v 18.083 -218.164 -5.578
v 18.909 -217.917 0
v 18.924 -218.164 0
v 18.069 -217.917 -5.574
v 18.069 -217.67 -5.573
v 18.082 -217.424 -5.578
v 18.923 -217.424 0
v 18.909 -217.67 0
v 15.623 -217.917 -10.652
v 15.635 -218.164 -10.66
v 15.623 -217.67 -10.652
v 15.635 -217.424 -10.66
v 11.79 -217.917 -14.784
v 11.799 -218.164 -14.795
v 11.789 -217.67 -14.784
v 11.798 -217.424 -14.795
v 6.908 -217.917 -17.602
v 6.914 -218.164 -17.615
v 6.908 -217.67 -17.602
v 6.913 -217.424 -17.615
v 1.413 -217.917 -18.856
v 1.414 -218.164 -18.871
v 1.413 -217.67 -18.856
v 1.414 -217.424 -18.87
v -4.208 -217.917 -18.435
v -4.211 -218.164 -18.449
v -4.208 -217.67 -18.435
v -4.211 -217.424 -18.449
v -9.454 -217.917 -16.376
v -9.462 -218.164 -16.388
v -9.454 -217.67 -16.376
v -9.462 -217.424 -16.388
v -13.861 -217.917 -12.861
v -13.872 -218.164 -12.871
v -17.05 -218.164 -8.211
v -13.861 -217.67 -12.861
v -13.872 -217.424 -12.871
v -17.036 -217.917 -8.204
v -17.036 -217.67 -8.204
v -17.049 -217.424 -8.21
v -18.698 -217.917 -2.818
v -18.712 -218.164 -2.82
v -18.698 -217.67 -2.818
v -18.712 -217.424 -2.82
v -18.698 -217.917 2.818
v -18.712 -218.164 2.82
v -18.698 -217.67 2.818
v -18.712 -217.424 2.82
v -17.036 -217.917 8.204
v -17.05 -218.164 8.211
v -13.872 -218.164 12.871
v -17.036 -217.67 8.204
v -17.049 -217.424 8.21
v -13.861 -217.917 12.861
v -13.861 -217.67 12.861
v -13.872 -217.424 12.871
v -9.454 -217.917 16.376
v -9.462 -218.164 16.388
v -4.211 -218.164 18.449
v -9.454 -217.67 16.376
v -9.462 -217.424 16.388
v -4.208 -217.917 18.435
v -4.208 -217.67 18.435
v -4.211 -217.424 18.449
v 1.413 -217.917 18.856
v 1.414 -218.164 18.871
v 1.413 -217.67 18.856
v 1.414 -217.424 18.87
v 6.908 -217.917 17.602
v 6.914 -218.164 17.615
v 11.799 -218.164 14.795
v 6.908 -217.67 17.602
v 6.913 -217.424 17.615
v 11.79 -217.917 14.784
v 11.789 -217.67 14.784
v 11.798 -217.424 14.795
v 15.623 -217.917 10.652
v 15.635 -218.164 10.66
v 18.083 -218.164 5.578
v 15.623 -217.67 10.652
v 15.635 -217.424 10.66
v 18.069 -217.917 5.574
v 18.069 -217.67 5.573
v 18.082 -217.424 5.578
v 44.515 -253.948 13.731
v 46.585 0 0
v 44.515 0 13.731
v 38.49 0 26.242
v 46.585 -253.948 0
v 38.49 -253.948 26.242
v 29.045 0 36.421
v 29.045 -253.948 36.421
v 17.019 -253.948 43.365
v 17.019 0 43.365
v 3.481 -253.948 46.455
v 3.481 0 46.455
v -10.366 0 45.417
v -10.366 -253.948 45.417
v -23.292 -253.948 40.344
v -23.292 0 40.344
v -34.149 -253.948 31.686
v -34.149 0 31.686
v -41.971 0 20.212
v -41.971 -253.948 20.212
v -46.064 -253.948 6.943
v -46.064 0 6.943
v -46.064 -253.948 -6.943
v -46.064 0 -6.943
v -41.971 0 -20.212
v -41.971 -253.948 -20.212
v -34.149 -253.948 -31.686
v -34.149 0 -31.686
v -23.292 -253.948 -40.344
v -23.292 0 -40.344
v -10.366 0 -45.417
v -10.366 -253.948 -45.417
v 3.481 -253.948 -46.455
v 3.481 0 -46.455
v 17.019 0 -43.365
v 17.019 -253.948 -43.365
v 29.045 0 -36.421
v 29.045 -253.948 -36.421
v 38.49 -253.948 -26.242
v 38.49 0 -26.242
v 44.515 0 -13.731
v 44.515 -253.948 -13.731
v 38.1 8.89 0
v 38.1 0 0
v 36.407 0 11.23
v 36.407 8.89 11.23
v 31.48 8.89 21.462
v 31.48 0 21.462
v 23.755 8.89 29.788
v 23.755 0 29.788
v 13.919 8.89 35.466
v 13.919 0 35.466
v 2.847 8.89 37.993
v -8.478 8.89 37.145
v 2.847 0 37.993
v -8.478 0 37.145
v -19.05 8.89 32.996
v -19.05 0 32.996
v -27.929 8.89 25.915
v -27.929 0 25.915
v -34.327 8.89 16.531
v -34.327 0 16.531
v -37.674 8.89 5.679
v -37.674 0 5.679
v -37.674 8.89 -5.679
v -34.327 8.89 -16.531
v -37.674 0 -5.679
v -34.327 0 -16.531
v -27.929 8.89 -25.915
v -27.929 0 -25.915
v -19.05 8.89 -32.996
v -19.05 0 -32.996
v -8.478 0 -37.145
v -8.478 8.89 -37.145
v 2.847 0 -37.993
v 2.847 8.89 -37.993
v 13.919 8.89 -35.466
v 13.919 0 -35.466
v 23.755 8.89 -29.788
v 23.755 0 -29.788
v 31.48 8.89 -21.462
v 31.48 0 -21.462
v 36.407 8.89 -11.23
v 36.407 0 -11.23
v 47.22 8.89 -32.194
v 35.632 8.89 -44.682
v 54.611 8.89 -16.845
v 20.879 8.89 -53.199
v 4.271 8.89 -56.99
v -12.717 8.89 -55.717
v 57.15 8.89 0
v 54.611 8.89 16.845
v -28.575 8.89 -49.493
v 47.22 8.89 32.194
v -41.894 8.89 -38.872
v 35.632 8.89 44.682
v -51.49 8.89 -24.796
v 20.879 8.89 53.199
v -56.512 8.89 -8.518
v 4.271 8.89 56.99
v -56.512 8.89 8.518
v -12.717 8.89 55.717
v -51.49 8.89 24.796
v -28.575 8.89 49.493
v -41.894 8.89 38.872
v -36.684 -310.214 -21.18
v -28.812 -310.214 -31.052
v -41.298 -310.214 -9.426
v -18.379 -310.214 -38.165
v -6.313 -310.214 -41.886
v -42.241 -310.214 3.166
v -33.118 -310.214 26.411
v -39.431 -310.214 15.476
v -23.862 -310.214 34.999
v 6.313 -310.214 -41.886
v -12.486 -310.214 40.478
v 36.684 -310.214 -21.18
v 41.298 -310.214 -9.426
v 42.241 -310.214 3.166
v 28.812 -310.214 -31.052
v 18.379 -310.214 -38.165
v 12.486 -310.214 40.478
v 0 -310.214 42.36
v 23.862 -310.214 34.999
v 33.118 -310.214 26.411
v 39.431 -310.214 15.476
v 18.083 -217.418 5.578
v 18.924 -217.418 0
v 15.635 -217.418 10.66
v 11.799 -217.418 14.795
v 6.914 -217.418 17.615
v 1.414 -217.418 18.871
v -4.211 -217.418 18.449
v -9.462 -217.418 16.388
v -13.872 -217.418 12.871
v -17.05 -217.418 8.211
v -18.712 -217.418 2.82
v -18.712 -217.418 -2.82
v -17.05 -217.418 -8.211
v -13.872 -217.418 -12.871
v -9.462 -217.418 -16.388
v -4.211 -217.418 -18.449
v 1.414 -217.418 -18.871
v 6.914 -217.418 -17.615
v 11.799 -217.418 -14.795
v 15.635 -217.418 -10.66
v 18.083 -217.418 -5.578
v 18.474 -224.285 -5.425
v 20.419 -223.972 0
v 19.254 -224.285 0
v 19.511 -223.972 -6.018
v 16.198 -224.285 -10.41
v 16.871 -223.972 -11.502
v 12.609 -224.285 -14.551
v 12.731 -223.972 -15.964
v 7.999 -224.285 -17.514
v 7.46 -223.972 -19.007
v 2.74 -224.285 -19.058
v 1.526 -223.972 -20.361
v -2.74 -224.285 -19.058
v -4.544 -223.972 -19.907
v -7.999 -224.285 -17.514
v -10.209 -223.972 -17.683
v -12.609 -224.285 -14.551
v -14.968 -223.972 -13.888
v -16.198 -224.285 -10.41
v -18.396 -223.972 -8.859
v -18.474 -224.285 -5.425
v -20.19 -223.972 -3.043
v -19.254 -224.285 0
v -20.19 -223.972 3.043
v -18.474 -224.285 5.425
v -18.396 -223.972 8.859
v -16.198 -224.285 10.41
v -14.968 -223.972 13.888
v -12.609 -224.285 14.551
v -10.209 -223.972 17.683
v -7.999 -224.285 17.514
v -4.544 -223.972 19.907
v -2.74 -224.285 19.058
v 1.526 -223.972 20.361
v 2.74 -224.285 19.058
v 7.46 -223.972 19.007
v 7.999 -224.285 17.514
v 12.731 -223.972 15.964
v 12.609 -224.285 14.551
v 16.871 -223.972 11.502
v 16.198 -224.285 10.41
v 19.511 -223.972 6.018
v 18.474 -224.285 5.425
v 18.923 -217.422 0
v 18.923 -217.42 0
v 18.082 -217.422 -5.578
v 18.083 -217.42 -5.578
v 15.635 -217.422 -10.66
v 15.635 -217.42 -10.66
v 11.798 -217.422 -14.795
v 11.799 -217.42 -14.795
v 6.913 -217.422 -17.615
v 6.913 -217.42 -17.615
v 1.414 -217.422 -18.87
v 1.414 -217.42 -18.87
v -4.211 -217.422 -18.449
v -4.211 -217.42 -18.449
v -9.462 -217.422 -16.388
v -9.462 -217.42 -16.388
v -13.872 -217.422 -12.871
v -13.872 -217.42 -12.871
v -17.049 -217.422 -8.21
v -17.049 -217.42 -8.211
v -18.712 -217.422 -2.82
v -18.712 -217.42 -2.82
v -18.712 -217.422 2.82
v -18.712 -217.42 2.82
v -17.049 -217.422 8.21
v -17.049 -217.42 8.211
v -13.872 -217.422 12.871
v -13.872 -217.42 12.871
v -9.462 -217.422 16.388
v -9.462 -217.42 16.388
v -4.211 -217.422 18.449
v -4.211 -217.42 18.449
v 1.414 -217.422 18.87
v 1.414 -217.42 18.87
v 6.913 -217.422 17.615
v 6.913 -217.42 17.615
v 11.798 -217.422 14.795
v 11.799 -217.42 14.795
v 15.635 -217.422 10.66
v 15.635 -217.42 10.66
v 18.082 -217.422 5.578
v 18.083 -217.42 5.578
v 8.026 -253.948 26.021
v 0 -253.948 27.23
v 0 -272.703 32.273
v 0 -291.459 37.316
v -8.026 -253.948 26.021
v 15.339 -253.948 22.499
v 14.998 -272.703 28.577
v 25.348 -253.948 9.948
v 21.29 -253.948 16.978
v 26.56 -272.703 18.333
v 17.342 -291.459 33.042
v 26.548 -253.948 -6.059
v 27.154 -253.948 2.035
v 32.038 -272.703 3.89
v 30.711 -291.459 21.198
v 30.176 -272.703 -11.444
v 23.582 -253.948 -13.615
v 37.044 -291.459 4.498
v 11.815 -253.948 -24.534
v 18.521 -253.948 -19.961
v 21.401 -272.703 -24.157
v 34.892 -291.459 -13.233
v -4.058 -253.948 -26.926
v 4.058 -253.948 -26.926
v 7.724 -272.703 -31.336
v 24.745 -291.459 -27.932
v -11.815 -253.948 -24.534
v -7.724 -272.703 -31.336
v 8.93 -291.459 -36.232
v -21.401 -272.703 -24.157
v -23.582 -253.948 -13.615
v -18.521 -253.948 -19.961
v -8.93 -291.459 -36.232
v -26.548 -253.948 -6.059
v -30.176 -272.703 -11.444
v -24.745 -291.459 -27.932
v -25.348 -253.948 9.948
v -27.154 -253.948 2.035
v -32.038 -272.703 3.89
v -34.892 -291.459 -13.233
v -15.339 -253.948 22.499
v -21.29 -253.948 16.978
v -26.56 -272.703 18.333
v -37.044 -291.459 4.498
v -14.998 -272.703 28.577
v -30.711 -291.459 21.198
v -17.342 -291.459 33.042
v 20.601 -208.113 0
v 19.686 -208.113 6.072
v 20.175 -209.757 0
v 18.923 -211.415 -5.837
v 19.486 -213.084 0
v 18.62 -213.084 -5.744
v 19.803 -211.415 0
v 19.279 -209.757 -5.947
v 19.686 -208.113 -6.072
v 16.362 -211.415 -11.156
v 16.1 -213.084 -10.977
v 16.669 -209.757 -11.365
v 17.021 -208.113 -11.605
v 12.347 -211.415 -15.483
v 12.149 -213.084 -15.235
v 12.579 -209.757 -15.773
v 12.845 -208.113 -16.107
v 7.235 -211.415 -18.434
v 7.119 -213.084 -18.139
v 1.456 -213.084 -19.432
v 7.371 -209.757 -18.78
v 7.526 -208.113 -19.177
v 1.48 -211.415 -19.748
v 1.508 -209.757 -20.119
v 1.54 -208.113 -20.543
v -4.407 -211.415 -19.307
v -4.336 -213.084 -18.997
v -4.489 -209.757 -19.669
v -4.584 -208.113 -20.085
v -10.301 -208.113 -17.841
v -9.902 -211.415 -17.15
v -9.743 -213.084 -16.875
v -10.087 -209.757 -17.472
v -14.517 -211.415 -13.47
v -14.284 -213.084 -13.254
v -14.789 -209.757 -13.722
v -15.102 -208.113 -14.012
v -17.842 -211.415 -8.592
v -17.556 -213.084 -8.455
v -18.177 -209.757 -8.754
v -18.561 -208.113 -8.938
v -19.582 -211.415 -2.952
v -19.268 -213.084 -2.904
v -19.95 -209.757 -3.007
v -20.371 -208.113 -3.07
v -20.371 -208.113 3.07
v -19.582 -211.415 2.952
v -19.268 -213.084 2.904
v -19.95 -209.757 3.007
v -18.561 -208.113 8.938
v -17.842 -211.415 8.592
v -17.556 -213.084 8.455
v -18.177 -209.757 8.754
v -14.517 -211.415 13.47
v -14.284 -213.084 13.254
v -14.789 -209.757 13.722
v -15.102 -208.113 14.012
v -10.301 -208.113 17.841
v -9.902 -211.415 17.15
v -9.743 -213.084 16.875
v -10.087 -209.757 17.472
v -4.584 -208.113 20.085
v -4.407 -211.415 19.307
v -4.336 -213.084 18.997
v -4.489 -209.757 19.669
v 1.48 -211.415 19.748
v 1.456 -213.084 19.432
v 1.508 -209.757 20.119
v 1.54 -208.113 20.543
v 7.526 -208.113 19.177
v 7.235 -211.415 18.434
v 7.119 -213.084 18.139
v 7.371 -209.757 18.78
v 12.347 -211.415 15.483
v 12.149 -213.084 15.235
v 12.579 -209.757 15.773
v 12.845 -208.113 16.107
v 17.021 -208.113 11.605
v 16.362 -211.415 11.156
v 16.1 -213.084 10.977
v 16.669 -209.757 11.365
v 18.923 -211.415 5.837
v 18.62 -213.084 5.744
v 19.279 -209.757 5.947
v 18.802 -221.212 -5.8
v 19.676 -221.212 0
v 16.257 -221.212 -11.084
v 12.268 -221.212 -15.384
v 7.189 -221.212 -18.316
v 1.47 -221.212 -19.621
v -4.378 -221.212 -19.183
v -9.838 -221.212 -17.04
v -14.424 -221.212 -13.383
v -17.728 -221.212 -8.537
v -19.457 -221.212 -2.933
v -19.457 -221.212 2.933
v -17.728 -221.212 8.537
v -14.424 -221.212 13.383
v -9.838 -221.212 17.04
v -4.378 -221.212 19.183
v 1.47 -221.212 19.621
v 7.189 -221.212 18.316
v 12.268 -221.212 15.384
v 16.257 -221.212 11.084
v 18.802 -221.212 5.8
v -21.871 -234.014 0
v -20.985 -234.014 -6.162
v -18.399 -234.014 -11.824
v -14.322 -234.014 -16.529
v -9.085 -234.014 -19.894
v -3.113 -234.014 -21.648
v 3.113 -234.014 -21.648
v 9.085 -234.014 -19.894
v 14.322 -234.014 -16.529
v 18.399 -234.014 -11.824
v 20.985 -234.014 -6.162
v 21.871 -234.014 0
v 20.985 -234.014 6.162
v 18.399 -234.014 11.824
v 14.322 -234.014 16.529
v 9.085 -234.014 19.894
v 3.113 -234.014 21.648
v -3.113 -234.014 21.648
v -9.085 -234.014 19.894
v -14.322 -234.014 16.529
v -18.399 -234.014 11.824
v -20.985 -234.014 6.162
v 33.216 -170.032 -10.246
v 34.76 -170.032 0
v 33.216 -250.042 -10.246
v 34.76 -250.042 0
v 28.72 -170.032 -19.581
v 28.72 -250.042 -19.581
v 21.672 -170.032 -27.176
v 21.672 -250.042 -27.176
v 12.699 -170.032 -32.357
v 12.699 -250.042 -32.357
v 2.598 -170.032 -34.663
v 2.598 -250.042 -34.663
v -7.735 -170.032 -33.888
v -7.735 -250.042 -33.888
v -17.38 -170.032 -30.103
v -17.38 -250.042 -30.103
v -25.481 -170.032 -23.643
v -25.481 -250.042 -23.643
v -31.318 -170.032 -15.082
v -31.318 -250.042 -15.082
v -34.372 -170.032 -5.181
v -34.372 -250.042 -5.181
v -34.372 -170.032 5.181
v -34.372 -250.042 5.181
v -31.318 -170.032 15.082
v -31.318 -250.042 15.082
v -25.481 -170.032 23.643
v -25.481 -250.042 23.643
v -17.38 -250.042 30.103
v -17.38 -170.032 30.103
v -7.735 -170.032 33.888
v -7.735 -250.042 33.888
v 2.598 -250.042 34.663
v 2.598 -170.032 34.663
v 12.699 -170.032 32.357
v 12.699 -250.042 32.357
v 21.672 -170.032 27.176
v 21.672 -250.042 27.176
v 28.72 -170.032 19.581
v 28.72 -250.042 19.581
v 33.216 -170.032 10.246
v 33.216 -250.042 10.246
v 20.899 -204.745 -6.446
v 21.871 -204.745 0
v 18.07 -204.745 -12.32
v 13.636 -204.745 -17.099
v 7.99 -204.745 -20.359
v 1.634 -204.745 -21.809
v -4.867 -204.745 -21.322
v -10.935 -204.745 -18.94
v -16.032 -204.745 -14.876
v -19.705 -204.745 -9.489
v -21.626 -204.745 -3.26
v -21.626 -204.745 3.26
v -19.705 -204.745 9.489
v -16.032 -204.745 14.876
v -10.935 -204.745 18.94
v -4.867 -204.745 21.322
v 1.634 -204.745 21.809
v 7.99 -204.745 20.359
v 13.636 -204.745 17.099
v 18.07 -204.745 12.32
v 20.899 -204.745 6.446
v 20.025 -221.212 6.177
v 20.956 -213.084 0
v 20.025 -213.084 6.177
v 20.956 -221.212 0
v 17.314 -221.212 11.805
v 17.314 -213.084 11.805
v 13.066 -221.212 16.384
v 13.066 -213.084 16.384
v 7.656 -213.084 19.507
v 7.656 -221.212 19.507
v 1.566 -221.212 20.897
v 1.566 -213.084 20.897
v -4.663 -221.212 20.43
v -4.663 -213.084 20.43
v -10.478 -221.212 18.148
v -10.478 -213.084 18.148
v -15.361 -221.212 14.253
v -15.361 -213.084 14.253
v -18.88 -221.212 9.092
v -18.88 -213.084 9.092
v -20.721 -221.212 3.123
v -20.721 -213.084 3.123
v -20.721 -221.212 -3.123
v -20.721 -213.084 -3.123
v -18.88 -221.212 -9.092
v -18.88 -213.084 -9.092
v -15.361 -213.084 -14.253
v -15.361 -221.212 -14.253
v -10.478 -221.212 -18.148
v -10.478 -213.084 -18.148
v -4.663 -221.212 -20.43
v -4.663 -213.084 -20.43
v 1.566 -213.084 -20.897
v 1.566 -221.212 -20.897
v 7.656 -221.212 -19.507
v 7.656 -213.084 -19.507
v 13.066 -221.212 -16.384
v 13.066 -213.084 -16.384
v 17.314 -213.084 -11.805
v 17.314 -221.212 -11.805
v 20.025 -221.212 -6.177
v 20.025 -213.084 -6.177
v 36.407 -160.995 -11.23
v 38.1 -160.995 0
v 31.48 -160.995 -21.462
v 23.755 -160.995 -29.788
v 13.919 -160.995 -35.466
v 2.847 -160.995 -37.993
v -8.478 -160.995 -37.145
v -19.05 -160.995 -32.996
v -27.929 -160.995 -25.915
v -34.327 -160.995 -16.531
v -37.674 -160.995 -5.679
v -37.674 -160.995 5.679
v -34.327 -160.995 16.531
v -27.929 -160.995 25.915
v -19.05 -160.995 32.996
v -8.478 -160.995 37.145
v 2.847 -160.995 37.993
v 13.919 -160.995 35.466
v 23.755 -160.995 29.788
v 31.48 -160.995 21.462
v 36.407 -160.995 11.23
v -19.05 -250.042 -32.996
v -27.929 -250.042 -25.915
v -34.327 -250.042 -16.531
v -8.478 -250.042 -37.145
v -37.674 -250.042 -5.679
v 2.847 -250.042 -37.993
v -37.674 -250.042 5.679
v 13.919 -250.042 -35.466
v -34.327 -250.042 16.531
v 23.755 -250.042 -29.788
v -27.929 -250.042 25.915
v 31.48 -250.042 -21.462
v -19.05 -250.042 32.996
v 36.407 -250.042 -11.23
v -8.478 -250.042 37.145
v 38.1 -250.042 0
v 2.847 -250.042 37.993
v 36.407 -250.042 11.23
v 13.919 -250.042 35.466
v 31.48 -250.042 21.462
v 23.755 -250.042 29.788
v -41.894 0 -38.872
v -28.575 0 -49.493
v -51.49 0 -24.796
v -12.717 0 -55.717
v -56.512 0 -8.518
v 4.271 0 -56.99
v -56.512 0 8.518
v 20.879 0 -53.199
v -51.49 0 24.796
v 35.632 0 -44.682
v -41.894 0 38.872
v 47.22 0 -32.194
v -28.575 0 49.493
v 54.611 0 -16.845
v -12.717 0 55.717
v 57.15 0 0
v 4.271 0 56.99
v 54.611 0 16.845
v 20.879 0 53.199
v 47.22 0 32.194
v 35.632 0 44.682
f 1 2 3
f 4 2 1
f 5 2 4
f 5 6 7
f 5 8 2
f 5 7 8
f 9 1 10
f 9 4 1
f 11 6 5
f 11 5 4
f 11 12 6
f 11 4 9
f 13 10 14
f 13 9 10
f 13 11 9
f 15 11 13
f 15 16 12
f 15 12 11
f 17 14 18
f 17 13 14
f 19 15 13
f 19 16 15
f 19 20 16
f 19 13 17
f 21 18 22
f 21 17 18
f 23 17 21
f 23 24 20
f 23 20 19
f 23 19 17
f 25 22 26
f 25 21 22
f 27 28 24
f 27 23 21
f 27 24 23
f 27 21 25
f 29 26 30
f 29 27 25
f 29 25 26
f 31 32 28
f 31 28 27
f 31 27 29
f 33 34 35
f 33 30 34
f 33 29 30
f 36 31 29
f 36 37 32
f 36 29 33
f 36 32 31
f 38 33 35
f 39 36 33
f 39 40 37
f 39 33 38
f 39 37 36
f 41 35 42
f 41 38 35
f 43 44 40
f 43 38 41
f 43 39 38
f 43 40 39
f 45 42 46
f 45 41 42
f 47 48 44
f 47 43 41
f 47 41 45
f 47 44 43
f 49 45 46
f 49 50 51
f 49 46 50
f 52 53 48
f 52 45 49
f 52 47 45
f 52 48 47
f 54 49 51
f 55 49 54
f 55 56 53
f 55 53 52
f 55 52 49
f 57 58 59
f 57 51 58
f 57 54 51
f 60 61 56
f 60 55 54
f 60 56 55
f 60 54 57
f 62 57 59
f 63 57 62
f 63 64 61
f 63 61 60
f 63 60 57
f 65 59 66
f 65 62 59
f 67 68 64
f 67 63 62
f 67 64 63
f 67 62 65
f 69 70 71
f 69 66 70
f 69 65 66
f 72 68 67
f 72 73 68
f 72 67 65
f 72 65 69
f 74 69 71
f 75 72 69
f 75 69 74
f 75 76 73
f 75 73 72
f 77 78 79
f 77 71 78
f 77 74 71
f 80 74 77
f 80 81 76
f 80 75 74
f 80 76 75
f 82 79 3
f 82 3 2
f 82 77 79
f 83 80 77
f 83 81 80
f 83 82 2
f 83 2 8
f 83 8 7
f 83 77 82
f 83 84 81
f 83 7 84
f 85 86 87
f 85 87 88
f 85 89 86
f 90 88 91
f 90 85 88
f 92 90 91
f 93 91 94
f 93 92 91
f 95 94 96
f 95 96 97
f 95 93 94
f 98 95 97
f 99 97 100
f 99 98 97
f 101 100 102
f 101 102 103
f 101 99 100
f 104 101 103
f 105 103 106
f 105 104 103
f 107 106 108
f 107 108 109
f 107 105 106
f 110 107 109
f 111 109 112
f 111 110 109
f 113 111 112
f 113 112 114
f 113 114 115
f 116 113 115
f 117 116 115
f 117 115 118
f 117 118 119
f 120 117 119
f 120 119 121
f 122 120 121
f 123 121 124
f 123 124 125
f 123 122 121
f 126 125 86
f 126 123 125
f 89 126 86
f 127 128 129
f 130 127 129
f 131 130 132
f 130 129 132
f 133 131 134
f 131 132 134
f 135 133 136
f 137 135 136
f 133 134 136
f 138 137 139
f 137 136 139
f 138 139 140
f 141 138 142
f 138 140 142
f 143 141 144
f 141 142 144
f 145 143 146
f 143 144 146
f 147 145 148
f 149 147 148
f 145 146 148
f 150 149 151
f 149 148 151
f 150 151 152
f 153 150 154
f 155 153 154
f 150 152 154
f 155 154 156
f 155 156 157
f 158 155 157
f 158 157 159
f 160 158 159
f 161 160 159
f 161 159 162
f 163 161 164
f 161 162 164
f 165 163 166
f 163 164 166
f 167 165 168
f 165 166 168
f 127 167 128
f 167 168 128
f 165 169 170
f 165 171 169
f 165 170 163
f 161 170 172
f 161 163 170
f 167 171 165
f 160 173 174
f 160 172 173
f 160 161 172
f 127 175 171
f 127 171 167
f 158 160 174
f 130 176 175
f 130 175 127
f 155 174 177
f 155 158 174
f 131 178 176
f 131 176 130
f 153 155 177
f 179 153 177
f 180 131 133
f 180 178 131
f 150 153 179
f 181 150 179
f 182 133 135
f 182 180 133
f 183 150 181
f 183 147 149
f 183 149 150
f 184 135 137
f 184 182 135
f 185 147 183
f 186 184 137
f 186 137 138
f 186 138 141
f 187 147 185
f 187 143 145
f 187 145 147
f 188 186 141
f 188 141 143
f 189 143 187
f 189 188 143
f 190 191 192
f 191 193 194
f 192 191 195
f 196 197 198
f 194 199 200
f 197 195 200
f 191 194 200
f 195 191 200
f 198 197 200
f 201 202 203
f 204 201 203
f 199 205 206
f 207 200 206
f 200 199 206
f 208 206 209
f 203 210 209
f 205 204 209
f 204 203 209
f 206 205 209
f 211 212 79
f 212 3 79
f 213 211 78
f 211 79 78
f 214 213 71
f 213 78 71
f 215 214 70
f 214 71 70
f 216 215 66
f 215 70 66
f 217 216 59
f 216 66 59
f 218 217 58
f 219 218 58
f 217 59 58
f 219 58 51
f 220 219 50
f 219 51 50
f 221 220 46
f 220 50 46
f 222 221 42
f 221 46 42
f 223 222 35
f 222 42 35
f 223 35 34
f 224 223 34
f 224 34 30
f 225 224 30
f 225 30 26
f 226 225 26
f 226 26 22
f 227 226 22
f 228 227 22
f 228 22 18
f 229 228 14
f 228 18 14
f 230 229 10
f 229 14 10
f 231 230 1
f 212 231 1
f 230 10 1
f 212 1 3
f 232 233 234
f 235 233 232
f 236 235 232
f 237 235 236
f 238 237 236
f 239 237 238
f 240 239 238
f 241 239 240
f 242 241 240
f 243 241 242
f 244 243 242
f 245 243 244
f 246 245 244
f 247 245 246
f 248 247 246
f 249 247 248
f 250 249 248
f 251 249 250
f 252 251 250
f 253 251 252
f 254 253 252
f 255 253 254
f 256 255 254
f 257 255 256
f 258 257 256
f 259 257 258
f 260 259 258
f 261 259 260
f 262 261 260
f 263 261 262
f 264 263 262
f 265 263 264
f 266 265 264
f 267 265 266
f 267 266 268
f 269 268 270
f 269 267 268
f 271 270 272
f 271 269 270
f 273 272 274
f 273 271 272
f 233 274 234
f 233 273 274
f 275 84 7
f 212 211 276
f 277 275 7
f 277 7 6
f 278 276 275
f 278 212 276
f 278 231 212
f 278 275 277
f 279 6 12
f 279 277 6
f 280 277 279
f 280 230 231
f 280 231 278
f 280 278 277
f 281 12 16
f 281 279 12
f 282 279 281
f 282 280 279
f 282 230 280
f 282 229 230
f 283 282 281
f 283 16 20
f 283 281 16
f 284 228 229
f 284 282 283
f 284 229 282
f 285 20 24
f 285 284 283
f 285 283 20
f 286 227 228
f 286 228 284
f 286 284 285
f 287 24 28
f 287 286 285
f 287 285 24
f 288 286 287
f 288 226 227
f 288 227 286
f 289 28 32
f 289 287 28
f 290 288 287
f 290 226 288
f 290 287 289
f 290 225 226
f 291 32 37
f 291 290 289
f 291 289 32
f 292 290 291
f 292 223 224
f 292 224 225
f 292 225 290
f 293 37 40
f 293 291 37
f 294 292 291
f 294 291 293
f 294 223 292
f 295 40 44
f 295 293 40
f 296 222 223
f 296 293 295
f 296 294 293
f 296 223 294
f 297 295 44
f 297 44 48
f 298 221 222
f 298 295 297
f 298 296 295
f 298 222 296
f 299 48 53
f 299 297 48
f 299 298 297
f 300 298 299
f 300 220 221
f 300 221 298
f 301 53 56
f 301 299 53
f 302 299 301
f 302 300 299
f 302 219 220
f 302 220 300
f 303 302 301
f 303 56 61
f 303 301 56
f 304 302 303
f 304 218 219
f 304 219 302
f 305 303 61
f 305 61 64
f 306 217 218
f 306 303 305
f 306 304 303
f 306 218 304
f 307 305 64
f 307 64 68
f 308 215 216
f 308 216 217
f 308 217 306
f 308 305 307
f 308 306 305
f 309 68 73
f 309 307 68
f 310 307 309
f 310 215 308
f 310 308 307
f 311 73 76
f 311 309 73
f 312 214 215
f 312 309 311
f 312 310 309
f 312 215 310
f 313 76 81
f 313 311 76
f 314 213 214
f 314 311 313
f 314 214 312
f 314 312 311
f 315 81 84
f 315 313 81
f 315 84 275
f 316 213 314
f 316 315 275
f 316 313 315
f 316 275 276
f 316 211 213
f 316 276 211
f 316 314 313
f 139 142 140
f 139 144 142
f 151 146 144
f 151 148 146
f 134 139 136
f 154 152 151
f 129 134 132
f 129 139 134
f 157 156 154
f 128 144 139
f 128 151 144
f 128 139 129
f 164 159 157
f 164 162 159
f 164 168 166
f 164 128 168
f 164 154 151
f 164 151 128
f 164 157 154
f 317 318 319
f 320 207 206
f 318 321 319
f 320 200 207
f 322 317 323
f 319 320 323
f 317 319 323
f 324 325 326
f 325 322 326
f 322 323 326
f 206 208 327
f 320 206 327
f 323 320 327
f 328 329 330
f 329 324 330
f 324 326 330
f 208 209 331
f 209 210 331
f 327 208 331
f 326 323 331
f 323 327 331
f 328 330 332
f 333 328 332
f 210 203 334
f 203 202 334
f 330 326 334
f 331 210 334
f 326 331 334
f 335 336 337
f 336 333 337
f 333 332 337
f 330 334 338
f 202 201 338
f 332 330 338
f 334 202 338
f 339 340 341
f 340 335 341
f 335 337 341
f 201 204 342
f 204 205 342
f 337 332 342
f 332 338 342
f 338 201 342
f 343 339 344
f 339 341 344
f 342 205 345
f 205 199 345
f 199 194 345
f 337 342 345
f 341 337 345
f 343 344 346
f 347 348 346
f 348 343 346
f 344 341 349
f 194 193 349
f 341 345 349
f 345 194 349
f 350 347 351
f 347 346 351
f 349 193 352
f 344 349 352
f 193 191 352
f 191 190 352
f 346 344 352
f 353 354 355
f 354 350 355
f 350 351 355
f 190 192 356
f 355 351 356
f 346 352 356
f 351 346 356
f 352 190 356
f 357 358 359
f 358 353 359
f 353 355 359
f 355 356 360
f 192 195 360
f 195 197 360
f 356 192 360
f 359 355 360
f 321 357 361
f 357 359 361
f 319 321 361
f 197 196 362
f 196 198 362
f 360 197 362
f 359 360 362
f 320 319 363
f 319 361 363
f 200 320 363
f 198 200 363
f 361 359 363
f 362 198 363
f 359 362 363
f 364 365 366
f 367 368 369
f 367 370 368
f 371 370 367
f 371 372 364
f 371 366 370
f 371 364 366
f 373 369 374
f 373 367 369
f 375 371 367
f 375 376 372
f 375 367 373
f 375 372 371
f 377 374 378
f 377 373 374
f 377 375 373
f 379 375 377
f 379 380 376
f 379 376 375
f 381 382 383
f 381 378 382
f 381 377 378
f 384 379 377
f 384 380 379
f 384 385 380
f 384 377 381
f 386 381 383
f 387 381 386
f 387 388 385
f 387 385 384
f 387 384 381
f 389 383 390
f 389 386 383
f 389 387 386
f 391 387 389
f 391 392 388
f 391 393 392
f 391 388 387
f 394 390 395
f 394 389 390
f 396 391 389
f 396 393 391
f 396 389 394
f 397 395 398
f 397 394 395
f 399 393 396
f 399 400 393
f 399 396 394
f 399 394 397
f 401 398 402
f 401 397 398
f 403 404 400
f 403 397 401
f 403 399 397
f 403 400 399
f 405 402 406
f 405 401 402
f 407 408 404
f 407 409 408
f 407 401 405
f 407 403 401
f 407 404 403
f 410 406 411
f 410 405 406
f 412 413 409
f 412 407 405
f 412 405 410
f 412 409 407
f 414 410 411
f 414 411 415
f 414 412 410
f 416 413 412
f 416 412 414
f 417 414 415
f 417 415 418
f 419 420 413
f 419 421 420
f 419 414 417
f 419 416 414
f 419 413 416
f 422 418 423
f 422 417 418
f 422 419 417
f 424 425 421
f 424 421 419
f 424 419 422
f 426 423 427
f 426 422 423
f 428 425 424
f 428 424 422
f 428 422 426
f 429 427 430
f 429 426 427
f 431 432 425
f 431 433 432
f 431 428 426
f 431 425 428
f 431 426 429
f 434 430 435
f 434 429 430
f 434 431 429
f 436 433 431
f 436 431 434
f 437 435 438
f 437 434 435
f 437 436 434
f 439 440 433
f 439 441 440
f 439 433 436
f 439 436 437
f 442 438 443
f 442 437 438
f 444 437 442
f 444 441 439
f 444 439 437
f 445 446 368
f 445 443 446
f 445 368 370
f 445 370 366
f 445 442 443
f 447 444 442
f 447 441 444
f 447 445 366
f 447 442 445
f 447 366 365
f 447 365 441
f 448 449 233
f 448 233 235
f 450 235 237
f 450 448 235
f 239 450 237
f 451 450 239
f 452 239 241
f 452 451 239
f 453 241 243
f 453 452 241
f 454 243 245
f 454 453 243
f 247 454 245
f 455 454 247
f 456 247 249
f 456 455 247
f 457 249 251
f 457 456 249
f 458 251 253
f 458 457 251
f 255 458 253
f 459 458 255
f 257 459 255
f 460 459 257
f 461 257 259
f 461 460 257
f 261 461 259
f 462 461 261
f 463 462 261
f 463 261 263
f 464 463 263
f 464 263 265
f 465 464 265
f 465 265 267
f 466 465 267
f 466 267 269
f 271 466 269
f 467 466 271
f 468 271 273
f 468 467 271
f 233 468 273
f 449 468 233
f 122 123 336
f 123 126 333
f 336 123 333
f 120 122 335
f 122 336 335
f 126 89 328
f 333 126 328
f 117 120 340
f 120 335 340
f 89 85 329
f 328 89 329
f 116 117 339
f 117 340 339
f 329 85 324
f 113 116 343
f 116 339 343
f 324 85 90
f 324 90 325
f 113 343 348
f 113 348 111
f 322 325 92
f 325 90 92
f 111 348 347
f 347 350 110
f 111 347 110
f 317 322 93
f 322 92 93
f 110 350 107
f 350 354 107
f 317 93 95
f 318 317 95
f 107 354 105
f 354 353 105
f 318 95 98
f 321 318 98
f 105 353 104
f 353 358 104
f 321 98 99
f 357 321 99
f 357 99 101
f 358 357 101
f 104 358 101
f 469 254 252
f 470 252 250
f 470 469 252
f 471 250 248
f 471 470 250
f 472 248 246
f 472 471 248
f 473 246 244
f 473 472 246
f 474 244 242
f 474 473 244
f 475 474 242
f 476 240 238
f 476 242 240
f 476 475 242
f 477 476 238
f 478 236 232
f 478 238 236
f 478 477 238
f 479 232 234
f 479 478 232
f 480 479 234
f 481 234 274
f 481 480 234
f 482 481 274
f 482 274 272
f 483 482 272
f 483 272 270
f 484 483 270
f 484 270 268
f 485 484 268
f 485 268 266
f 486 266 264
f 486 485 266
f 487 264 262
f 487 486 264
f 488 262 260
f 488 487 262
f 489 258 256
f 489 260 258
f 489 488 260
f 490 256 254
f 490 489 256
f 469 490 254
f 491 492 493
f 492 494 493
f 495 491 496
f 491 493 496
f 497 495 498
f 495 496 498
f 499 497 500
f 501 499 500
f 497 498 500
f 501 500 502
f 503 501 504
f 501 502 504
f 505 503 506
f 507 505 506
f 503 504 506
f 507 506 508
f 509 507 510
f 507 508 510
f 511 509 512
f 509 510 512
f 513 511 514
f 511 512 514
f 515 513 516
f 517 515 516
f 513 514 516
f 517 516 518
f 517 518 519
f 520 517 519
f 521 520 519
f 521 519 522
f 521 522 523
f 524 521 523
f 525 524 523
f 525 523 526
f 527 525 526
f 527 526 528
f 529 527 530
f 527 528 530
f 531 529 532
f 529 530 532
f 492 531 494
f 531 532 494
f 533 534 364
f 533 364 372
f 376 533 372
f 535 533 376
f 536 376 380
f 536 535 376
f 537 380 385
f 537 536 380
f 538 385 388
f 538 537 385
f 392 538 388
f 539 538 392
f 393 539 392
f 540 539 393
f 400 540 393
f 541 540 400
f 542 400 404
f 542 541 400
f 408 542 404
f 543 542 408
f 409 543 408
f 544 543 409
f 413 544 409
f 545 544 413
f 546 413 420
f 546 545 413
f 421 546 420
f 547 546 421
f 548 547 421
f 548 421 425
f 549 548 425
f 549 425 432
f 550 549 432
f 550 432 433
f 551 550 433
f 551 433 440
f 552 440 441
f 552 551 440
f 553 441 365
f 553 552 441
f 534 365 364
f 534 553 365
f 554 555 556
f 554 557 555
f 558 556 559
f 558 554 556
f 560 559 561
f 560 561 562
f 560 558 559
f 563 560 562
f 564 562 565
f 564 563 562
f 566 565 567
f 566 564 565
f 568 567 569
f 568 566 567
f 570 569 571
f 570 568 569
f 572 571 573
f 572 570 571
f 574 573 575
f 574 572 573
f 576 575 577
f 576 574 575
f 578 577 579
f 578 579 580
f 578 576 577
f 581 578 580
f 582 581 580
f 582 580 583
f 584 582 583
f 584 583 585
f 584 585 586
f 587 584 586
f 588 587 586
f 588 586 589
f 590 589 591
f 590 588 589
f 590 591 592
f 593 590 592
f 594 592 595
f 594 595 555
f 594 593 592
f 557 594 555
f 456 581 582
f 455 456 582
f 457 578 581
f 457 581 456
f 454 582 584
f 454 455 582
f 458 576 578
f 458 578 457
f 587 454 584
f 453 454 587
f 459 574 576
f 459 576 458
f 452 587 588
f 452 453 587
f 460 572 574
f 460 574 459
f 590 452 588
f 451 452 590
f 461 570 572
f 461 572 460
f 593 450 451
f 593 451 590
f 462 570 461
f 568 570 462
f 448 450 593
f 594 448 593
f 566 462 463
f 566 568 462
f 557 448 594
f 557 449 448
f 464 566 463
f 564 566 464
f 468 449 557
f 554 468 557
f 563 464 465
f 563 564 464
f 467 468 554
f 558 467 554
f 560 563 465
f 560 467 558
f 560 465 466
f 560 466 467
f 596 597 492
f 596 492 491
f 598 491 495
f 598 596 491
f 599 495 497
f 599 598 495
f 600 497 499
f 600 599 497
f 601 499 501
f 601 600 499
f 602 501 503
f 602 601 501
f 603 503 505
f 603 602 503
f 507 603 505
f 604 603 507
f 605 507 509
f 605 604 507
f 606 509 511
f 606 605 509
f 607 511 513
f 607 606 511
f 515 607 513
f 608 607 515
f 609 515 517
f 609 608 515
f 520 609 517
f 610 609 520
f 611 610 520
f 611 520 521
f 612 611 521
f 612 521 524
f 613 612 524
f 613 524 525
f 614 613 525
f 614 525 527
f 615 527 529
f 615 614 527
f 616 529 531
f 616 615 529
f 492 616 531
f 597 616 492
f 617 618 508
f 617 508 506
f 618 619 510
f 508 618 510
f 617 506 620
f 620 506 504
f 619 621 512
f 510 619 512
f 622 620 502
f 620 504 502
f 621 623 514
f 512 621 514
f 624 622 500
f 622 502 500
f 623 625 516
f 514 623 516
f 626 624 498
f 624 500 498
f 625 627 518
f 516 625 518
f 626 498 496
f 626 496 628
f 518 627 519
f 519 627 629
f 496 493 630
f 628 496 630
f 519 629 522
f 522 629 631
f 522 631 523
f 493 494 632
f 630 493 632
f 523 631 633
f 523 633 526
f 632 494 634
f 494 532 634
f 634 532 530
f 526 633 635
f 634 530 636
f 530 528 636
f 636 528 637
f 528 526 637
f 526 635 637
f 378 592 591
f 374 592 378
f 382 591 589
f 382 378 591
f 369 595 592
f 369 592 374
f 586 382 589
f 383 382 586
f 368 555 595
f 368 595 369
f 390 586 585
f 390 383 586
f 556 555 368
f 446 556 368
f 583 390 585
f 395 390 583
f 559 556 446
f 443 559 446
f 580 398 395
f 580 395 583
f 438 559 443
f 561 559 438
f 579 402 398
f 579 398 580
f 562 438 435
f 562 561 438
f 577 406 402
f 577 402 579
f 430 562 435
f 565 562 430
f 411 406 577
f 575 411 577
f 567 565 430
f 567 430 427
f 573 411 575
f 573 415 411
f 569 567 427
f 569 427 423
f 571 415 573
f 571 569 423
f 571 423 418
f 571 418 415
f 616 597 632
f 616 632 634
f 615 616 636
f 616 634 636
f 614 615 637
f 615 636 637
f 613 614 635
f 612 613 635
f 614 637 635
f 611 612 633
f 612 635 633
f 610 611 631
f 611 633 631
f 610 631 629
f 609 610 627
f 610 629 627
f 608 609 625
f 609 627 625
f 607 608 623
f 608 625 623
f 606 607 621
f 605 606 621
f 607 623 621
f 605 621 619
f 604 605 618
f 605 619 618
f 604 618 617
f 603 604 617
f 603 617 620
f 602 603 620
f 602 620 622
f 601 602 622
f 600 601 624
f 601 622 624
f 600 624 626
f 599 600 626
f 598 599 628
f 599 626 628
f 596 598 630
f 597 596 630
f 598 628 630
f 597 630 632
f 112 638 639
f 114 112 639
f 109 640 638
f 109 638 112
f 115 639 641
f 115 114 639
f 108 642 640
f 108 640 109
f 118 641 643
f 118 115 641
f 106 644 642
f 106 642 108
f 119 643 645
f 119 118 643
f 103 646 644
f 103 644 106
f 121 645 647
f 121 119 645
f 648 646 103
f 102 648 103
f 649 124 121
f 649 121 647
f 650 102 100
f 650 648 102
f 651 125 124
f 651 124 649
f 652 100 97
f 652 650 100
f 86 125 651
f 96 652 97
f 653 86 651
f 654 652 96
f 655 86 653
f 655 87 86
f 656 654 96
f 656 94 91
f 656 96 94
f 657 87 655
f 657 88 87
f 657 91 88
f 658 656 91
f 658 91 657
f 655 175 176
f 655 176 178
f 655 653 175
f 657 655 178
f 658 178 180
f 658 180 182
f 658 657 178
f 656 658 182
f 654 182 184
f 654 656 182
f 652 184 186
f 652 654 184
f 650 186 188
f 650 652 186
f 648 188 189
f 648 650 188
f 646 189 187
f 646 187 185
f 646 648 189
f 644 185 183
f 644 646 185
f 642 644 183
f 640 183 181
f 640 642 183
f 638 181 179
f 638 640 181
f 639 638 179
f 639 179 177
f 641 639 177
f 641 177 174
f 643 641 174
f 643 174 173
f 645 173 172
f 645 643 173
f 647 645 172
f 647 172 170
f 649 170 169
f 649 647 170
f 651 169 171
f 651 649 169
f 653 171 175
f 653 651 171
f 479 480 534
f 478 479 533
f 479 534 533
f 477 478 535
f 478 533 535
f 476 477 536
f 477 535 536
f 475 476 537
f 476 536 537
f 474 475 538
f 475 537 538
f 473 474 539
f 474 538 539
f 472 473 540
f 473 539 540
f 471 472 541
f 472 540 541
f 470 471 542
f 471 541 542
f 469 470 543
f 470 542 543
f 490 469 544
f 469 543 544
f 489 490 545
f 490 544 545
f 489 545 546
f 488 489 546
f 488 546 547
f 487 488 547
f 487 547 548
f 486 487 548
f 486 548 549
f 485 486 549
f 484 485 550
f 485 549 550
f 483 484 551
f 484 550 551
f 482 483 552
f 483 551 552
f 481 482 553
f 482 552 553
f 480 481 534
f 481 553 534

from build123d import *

# Parameters (mm, degrees)
CUT_EXTRUDE1_DEPTH      = 42.656
CUT_EXTRUDE1_DEPTH_BACK = 42.656


with BuildPart() as part:
    # Sketch1 → CHAMBER GEOMETRY (revolve)
    with BuildSketch(Plane.XY):
        with BuildLine():
            Line((0, 0), (-38.1, 0))
            Line((-38.1, 0), (-38.1, -157.332041631))
            Line((-38.1, -157.332041631), (-19.331058169, -208.113159893))
            ThreePointArc((-19.331058169, -208.113159893), (-18.081947937, -212.694672543), (-17.653, -217.424))
            ThreePointArc((-17.653, -217.424), (-17.710909205, -218.322313303), (-17.888255676, -219.204848569))
            Line((-17.888255676, -219.204848569), (-41.656, -307.594))
            Line((-41.656, -307.594), (0, -307.594))
            Line((0, -307.594), (0, 0))
        make_face()
    revolve(axis=Axis((0, 0, 0), (0, -1, 0)))

    # Sketch3 → CF REVOLVE (revolve)
    with BuildSketch(Plane.XY):
        with BuildLine():
            ThreePointArc((19.052545295, -218.891772388), (18.923521318, -218.163557003), (18.923, -217.424))
            ThreePointArc((18.923, -217.424), (19.548451138, -212.730087586), (20.601058169, -208.113159893))
            Line((20.601058169, -208.113159893), (19.331058169, -208.113159893))
            ThreePointArc((19.331058169, -208.113159893), (18.081947937, -212.694672543), (17.653, -217.424))
            ThreePointArc((17.653, -217.424), (17.710909205, -218.322313303), (17.888255676, -219.204848569))
            Line((17.888255676, -219.204848569), (19.254262016, -224.284848569))
            Line((19.254262016, -224.284848569), (20.418551634, -223.971772388))
            Line((20.418551634, -223.971772388), (19.052545295, -218.891772388))
        make_face()
        Polygon((24.927703857, -196.634205845), (23.736466151, -196.193918747), (19.331058169, -208.113159893), (20.601058169, -208.113159893), align=None)
        Polygon((39.453969902, -157.332041631), (38.1, -157.332041631), (23.736466151, -196.193918747), (24.927703857, -196.634205845), align=None)
        Polygon((39.453969902, -132.003733221), (37.984578859, -132.003733221), (38.1, -157.332041631), (39.453969902, -157.332041631), align=None)
    revolve(axis=Axis((0, -217.424, 0), (0, 1, 0)))

    # Sketch4 → RTV/EPOXY (revolve)
    with BuildSketch(Plane.XY):
        Polygon((18.923521318, -218.163557003), (18.923521318, -213.083557003), (20.955521318, -213.083557003), (20.955521318, -221.211557003), (18.923521318, -221.211557003), align=None)
    revolve(axis=Axis((0, -217.424, 0), (0, -1, 0)))

    # Sketch6 → Cut-Extrude1 (cut, two sides)
    with BuildSketch(Plane.XY) as cut_extrude1_sk:
        Polygon((41.656, -307.594), (21.870533279, -234.014421294), (-21.870533279, -234.014421294), (-41.656, -307.594), align=None)
    extrude(amount=CUT_EXTRUDE1_DEPTH, mode=Mode.SUBTRACT)
    extrude(cut_extrude1_sk.sketch, amount=-CUT_EXTRUDE1_DEPTH_BACK, mode=Mode.SUBTRACT)

    # Sketch7 → DASHED RTV/EPOXY (revolve)
    with BuildSketch(Plane(origin=(0, 0, 0), x_dir=(0, 0, -1), z_dir=(1, 0, 0))):
        Polygon((-21.870533279, -234.014421294), (-42.359549747, -310.214421294), (0, -310.214421294), (0, -234.014421294), align=None)
    revolve(axis=Axis((0, -310.214421294, 0), (0, 1, 0)))

    # Sketch10 → DASHED RTV/EPOXY OVERHANG (revolve)
    with BuildSketch(Plane.XY):
        Polygon((21.870533279, -204.745135906), (34.75998975, -170.032041631), (34.75998975, -250.042041631), (26.180115655, -250.042041631), (21.870533279, -234.014421294), align=None)
    revolve(axis=Axis((0, -221.211557003, 0), (0, 1, 0)))

    # Sketch11 → BLUE TUBE (revolve)
    with BuildSketch(Plane.XY):
        Polygon((34.75998975, -253.947859685), (27.23033049, -253.947859685), (25.282654818, -253.947859685), (25.282654818, -250.042041631), (27.23033049, -250.042041631), (34.75998975, -250.042041631), (38.1, -250.042041631), (38.1, -132.003733221), (38.1, 0), (38.1, 8.89), (57.15, 8.89), (57.15, 0), (46.584796967, 0), (46.584796967, -253.947859685), align=None)
    revolve(axis=Axis((0, 0, 0), (0, -1, 0)))


solid = part.part
